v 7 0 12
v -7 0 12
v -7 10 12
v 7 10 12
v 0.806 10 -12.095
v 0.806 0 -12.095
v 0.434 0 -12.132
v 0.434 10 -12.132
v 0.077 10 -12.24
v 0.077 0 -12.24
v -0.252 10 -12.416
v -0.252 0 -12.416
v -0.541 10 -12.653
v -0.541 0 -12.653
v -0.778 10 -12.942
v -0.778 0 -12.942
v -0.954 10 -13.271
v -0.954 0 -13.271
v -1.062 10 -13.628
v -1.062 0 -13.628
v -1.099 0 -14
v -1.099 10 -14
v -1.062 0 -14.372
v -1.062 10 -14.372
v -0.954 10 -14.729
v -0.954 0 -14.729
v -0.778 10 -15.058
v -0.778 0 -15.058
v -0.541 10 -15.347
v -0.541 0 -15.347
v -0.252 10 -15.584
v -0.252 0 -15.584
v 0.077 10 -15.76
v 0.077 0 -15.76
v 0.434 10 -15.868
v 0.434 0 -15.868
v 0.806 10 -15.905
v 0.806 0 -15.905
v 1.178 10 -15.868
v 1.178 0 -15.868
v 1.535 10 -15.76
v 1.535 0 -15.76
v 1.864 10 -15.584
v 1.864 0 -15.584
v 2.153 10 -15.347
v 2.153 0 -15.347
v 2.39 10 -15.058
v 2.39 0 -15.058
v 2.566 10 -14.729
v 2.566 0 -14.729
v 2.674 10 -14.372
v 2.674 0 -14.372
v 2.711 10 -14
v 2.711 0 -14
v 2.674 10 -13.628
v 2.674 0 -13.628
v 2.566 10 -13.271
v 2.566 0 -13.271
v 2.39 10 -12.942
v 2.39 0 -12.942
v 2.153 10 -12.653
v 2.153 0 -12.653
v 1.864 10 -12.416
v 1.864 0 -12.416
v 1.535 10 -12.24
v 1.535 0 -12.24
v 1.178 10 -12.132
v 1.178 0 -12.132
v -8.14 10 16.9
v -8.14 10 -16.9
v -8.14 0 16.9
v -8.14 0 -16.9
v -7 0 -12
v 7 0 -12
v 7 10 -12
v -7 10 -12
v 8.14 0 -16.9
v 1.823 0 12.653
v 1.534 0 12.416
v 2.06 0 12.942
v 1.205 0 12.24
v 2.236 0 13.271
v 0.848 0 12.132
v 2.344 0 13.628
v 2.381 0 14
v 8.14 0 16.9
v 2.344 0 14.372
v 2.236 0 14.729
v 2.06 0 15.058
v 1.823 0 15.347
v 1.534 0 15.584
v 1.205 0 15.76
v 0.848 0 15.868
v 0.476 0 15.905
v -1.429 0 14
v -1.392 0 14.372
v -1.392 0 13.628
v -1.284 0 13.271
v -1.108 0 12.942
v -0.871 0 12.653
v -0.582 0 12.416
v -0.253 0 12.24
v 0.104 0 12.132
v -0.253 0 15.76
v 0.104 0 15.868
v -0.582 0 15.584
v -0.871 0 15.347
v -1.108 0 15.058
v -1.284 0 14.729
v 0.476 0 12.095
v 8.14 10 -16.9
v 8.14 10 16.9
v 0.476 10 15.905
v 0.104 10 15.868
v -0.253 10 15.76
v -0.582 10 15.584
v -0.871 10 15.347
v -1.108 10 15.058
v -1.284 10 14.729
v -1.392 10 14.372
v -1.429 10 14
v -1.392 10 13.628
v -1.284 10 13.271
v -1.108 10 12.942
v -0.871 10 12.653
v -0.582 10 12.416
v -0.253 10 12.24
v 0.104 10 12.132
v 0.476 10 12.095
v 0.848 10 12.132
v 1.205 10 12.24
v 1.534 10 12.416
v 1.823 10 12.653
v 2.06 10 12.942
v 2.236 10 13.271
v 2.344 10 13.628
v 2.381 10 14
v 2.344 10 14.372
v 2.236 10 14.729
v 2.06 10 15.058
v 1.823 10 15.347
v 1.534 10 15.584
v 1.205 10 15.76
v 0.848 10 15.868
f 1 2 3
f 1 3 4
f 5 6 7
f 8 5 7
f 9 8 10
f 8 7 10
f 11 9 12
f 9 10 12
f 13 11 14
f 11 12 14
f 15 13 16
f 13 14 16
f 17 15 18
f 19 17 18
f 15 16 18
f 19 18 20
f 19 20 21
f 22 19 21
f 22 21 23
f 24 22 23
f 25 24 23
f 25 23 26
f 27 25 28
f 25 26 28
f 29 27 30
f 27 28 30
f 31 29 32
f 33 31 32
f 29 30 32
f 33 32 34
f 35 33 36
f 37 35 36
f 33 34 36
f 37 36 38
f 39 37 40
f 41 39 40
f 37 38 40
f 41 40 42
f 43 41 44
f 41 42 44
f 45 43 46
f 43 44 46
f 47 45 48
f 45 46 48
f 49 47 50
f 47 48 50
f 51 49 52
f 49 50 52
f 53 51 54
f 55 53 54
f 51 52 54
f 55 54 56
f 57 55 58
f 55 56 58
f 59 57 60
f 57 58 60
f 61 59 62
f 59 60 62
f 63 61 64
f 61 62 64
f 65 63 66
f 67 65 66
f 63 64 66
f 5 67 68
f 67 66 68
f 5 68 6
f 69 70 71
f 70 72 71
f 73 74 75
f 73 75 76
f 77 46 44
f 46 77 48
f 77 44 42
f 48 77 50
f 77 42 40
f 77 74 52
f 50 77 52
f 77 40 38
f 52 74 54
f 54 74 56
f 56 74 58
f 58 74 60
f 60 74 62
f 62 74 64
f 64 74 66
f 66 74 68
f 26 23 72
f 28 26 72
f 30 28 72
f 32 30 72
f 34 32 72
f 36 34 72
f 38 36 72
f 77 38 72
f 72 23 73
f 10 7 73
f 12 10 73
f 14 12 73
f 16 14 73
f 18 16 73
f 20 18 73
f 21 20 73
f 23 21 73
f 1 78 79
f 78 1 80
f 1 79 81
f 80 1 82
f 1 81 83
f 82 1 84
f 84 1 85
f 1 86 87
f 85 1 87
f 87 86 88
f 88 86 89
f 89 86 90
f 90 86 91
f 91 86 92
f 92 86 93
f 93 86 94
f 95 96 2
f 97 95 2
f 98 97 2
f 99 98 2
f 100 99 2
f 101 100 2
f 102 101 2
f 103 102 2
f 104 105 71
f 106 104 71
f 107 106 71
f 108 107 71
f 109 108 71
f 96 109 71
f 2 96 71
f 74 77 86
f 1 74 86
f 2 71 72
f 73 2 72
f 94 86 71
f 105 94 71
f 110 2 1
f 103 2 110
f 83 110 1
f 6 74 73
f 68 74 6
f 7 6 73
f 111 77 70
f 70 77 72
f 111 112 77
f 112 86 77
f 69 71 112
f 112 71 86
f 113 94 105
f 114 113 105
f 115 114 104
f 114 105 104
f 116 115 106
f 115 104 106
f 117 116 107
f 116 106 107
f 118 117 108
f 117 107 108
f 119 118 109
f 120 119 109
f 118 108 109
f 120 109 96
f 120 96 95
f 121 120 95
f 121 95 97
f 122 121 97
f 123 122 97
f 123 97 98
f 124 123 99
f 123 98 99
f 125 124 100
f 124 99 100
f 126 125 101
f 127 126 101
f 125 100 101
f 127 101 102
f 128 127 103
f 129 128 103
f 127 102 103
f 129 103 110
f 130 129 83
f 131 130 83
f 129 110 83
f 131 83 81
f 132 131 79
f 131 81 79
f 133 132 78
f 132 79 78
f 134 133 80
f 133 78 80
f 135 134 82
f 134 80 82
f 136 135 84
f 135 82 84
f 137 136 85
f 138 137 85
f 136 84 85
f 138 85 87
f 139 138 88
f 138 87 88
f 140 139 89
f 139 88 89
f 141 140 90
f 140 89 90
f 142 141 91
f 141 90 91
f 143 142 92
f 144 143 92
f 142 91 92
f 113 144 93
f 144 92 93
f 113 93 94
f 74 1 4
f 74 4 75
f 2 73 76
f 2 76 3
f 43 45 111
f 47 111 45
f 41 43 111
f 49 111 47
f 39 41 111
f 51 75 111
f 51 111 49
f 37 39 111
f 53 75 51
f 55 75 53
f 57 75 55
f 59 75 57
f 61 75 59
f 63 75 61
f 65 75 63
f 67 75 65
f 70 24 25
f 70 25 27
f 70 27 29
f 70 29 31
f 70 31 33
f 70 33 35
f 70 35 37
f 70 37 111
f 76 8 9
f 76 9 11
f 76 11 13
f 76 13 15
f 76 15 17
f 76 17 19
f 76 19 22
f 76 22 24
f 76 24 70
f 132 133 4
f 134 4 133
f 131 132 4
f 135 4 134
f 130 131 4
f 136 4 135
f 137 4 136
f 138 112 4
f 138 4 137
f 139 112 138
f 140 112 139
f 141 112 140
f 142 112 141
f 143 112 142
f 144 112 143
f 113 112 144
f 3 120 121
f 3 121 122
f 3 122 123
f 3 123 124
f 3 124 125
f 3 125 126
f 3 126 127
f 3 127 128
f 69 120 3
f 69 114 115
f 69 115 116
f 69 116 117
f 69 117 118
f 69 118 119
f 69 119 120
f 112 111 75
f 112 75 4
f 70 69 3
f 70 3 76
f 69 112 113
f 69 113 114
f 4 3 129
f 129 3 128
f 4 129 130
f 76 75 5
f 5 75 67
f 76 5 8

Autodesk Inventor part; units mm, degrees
ref_plane "YZ Plane" through (0, 0, 0) normal (1, 0, 0) x (0, 1, 0)
ref_plane "XZ Plane" through (0, 0, 0) normal (0, 1, 0) x (-1, 0, 0)
ref_plane "XY Plane" through (0, 0, 0) normal (0, 0, 1) x (1, 0, 0)
sketch "Sketch2" plane through (0, 0, 0) normal (0, 1, 0) x (-1, 0, 0)
  line L0 (8.14, 16.9) -> (-8.14, 16.9)
  line L1 (-8.14, 16.9) -> (-8.14, -16.9)
  line L2 (-8.14, -16.9) -> (8.14, -16.9)
  line L3 (8.14, -16.9) -> (8.14, 16.9)
  line L4 (8.14, 16.9) -> (-8.14, -16.9) construction
  line L5 (-8.14, 16.9) -> (8.14, -16.9) construction
  point P0 (0, 0)
  dimension "d0" = 33.8
  dimension "d1" = 16.28
sketch "Sketch3" plane through (0, 0, 0) normal (0, 1, 0) x (-1, 0, 0)
  line L0 (-7, -12) -> (7, -12)
  line L1 (7, -12) -> (7, 12)
  line L2 (7, 12) -> (-7, 12)
  line L3 (-7, 12) -> (-7, -12)
  line L4 (-7, -12) -> (7, 12) construction
  line L5 (7, -12) -> (-7, 12) construction
  point P0 (0, 0)
  dimension "d2" = 24
  dimension "d3" = 14
extrude "Extrusion1" add sketch "Sketch2" along normal blind 10
extrude "Extrusion2" cut sketch "Sketch3" along normal blind 10
sketch "Sketch5" plane through (0, 10, 0) normal (0, 1, 0) x (1, 0, 0)
  line L0 (7, -12) -> (-7, -12) projected
  point P0 (0, 0)
  point P1 (0.476, -14)
  dimension "d22" = 2
hole "Hole1" at (0.476, 10, 14) direction (0, -1, 0) diameter 3.81 depth 10
sketch "Sketch6" plane through (0, 10, 0) normal (0, 1, 0) x (1, 0, 0)
  line L0 (7, 12) -> (-7, 12) projected
  point P0 (0, 0)
  point P1 (0.8061, 14)
  dimension "d30" = 2
hole "Hole2" at (0.8061, 10, -14) direction (0, -1, 0) diameter 3.81 depth 10
properties part number "servo housing electric boogaloo"
